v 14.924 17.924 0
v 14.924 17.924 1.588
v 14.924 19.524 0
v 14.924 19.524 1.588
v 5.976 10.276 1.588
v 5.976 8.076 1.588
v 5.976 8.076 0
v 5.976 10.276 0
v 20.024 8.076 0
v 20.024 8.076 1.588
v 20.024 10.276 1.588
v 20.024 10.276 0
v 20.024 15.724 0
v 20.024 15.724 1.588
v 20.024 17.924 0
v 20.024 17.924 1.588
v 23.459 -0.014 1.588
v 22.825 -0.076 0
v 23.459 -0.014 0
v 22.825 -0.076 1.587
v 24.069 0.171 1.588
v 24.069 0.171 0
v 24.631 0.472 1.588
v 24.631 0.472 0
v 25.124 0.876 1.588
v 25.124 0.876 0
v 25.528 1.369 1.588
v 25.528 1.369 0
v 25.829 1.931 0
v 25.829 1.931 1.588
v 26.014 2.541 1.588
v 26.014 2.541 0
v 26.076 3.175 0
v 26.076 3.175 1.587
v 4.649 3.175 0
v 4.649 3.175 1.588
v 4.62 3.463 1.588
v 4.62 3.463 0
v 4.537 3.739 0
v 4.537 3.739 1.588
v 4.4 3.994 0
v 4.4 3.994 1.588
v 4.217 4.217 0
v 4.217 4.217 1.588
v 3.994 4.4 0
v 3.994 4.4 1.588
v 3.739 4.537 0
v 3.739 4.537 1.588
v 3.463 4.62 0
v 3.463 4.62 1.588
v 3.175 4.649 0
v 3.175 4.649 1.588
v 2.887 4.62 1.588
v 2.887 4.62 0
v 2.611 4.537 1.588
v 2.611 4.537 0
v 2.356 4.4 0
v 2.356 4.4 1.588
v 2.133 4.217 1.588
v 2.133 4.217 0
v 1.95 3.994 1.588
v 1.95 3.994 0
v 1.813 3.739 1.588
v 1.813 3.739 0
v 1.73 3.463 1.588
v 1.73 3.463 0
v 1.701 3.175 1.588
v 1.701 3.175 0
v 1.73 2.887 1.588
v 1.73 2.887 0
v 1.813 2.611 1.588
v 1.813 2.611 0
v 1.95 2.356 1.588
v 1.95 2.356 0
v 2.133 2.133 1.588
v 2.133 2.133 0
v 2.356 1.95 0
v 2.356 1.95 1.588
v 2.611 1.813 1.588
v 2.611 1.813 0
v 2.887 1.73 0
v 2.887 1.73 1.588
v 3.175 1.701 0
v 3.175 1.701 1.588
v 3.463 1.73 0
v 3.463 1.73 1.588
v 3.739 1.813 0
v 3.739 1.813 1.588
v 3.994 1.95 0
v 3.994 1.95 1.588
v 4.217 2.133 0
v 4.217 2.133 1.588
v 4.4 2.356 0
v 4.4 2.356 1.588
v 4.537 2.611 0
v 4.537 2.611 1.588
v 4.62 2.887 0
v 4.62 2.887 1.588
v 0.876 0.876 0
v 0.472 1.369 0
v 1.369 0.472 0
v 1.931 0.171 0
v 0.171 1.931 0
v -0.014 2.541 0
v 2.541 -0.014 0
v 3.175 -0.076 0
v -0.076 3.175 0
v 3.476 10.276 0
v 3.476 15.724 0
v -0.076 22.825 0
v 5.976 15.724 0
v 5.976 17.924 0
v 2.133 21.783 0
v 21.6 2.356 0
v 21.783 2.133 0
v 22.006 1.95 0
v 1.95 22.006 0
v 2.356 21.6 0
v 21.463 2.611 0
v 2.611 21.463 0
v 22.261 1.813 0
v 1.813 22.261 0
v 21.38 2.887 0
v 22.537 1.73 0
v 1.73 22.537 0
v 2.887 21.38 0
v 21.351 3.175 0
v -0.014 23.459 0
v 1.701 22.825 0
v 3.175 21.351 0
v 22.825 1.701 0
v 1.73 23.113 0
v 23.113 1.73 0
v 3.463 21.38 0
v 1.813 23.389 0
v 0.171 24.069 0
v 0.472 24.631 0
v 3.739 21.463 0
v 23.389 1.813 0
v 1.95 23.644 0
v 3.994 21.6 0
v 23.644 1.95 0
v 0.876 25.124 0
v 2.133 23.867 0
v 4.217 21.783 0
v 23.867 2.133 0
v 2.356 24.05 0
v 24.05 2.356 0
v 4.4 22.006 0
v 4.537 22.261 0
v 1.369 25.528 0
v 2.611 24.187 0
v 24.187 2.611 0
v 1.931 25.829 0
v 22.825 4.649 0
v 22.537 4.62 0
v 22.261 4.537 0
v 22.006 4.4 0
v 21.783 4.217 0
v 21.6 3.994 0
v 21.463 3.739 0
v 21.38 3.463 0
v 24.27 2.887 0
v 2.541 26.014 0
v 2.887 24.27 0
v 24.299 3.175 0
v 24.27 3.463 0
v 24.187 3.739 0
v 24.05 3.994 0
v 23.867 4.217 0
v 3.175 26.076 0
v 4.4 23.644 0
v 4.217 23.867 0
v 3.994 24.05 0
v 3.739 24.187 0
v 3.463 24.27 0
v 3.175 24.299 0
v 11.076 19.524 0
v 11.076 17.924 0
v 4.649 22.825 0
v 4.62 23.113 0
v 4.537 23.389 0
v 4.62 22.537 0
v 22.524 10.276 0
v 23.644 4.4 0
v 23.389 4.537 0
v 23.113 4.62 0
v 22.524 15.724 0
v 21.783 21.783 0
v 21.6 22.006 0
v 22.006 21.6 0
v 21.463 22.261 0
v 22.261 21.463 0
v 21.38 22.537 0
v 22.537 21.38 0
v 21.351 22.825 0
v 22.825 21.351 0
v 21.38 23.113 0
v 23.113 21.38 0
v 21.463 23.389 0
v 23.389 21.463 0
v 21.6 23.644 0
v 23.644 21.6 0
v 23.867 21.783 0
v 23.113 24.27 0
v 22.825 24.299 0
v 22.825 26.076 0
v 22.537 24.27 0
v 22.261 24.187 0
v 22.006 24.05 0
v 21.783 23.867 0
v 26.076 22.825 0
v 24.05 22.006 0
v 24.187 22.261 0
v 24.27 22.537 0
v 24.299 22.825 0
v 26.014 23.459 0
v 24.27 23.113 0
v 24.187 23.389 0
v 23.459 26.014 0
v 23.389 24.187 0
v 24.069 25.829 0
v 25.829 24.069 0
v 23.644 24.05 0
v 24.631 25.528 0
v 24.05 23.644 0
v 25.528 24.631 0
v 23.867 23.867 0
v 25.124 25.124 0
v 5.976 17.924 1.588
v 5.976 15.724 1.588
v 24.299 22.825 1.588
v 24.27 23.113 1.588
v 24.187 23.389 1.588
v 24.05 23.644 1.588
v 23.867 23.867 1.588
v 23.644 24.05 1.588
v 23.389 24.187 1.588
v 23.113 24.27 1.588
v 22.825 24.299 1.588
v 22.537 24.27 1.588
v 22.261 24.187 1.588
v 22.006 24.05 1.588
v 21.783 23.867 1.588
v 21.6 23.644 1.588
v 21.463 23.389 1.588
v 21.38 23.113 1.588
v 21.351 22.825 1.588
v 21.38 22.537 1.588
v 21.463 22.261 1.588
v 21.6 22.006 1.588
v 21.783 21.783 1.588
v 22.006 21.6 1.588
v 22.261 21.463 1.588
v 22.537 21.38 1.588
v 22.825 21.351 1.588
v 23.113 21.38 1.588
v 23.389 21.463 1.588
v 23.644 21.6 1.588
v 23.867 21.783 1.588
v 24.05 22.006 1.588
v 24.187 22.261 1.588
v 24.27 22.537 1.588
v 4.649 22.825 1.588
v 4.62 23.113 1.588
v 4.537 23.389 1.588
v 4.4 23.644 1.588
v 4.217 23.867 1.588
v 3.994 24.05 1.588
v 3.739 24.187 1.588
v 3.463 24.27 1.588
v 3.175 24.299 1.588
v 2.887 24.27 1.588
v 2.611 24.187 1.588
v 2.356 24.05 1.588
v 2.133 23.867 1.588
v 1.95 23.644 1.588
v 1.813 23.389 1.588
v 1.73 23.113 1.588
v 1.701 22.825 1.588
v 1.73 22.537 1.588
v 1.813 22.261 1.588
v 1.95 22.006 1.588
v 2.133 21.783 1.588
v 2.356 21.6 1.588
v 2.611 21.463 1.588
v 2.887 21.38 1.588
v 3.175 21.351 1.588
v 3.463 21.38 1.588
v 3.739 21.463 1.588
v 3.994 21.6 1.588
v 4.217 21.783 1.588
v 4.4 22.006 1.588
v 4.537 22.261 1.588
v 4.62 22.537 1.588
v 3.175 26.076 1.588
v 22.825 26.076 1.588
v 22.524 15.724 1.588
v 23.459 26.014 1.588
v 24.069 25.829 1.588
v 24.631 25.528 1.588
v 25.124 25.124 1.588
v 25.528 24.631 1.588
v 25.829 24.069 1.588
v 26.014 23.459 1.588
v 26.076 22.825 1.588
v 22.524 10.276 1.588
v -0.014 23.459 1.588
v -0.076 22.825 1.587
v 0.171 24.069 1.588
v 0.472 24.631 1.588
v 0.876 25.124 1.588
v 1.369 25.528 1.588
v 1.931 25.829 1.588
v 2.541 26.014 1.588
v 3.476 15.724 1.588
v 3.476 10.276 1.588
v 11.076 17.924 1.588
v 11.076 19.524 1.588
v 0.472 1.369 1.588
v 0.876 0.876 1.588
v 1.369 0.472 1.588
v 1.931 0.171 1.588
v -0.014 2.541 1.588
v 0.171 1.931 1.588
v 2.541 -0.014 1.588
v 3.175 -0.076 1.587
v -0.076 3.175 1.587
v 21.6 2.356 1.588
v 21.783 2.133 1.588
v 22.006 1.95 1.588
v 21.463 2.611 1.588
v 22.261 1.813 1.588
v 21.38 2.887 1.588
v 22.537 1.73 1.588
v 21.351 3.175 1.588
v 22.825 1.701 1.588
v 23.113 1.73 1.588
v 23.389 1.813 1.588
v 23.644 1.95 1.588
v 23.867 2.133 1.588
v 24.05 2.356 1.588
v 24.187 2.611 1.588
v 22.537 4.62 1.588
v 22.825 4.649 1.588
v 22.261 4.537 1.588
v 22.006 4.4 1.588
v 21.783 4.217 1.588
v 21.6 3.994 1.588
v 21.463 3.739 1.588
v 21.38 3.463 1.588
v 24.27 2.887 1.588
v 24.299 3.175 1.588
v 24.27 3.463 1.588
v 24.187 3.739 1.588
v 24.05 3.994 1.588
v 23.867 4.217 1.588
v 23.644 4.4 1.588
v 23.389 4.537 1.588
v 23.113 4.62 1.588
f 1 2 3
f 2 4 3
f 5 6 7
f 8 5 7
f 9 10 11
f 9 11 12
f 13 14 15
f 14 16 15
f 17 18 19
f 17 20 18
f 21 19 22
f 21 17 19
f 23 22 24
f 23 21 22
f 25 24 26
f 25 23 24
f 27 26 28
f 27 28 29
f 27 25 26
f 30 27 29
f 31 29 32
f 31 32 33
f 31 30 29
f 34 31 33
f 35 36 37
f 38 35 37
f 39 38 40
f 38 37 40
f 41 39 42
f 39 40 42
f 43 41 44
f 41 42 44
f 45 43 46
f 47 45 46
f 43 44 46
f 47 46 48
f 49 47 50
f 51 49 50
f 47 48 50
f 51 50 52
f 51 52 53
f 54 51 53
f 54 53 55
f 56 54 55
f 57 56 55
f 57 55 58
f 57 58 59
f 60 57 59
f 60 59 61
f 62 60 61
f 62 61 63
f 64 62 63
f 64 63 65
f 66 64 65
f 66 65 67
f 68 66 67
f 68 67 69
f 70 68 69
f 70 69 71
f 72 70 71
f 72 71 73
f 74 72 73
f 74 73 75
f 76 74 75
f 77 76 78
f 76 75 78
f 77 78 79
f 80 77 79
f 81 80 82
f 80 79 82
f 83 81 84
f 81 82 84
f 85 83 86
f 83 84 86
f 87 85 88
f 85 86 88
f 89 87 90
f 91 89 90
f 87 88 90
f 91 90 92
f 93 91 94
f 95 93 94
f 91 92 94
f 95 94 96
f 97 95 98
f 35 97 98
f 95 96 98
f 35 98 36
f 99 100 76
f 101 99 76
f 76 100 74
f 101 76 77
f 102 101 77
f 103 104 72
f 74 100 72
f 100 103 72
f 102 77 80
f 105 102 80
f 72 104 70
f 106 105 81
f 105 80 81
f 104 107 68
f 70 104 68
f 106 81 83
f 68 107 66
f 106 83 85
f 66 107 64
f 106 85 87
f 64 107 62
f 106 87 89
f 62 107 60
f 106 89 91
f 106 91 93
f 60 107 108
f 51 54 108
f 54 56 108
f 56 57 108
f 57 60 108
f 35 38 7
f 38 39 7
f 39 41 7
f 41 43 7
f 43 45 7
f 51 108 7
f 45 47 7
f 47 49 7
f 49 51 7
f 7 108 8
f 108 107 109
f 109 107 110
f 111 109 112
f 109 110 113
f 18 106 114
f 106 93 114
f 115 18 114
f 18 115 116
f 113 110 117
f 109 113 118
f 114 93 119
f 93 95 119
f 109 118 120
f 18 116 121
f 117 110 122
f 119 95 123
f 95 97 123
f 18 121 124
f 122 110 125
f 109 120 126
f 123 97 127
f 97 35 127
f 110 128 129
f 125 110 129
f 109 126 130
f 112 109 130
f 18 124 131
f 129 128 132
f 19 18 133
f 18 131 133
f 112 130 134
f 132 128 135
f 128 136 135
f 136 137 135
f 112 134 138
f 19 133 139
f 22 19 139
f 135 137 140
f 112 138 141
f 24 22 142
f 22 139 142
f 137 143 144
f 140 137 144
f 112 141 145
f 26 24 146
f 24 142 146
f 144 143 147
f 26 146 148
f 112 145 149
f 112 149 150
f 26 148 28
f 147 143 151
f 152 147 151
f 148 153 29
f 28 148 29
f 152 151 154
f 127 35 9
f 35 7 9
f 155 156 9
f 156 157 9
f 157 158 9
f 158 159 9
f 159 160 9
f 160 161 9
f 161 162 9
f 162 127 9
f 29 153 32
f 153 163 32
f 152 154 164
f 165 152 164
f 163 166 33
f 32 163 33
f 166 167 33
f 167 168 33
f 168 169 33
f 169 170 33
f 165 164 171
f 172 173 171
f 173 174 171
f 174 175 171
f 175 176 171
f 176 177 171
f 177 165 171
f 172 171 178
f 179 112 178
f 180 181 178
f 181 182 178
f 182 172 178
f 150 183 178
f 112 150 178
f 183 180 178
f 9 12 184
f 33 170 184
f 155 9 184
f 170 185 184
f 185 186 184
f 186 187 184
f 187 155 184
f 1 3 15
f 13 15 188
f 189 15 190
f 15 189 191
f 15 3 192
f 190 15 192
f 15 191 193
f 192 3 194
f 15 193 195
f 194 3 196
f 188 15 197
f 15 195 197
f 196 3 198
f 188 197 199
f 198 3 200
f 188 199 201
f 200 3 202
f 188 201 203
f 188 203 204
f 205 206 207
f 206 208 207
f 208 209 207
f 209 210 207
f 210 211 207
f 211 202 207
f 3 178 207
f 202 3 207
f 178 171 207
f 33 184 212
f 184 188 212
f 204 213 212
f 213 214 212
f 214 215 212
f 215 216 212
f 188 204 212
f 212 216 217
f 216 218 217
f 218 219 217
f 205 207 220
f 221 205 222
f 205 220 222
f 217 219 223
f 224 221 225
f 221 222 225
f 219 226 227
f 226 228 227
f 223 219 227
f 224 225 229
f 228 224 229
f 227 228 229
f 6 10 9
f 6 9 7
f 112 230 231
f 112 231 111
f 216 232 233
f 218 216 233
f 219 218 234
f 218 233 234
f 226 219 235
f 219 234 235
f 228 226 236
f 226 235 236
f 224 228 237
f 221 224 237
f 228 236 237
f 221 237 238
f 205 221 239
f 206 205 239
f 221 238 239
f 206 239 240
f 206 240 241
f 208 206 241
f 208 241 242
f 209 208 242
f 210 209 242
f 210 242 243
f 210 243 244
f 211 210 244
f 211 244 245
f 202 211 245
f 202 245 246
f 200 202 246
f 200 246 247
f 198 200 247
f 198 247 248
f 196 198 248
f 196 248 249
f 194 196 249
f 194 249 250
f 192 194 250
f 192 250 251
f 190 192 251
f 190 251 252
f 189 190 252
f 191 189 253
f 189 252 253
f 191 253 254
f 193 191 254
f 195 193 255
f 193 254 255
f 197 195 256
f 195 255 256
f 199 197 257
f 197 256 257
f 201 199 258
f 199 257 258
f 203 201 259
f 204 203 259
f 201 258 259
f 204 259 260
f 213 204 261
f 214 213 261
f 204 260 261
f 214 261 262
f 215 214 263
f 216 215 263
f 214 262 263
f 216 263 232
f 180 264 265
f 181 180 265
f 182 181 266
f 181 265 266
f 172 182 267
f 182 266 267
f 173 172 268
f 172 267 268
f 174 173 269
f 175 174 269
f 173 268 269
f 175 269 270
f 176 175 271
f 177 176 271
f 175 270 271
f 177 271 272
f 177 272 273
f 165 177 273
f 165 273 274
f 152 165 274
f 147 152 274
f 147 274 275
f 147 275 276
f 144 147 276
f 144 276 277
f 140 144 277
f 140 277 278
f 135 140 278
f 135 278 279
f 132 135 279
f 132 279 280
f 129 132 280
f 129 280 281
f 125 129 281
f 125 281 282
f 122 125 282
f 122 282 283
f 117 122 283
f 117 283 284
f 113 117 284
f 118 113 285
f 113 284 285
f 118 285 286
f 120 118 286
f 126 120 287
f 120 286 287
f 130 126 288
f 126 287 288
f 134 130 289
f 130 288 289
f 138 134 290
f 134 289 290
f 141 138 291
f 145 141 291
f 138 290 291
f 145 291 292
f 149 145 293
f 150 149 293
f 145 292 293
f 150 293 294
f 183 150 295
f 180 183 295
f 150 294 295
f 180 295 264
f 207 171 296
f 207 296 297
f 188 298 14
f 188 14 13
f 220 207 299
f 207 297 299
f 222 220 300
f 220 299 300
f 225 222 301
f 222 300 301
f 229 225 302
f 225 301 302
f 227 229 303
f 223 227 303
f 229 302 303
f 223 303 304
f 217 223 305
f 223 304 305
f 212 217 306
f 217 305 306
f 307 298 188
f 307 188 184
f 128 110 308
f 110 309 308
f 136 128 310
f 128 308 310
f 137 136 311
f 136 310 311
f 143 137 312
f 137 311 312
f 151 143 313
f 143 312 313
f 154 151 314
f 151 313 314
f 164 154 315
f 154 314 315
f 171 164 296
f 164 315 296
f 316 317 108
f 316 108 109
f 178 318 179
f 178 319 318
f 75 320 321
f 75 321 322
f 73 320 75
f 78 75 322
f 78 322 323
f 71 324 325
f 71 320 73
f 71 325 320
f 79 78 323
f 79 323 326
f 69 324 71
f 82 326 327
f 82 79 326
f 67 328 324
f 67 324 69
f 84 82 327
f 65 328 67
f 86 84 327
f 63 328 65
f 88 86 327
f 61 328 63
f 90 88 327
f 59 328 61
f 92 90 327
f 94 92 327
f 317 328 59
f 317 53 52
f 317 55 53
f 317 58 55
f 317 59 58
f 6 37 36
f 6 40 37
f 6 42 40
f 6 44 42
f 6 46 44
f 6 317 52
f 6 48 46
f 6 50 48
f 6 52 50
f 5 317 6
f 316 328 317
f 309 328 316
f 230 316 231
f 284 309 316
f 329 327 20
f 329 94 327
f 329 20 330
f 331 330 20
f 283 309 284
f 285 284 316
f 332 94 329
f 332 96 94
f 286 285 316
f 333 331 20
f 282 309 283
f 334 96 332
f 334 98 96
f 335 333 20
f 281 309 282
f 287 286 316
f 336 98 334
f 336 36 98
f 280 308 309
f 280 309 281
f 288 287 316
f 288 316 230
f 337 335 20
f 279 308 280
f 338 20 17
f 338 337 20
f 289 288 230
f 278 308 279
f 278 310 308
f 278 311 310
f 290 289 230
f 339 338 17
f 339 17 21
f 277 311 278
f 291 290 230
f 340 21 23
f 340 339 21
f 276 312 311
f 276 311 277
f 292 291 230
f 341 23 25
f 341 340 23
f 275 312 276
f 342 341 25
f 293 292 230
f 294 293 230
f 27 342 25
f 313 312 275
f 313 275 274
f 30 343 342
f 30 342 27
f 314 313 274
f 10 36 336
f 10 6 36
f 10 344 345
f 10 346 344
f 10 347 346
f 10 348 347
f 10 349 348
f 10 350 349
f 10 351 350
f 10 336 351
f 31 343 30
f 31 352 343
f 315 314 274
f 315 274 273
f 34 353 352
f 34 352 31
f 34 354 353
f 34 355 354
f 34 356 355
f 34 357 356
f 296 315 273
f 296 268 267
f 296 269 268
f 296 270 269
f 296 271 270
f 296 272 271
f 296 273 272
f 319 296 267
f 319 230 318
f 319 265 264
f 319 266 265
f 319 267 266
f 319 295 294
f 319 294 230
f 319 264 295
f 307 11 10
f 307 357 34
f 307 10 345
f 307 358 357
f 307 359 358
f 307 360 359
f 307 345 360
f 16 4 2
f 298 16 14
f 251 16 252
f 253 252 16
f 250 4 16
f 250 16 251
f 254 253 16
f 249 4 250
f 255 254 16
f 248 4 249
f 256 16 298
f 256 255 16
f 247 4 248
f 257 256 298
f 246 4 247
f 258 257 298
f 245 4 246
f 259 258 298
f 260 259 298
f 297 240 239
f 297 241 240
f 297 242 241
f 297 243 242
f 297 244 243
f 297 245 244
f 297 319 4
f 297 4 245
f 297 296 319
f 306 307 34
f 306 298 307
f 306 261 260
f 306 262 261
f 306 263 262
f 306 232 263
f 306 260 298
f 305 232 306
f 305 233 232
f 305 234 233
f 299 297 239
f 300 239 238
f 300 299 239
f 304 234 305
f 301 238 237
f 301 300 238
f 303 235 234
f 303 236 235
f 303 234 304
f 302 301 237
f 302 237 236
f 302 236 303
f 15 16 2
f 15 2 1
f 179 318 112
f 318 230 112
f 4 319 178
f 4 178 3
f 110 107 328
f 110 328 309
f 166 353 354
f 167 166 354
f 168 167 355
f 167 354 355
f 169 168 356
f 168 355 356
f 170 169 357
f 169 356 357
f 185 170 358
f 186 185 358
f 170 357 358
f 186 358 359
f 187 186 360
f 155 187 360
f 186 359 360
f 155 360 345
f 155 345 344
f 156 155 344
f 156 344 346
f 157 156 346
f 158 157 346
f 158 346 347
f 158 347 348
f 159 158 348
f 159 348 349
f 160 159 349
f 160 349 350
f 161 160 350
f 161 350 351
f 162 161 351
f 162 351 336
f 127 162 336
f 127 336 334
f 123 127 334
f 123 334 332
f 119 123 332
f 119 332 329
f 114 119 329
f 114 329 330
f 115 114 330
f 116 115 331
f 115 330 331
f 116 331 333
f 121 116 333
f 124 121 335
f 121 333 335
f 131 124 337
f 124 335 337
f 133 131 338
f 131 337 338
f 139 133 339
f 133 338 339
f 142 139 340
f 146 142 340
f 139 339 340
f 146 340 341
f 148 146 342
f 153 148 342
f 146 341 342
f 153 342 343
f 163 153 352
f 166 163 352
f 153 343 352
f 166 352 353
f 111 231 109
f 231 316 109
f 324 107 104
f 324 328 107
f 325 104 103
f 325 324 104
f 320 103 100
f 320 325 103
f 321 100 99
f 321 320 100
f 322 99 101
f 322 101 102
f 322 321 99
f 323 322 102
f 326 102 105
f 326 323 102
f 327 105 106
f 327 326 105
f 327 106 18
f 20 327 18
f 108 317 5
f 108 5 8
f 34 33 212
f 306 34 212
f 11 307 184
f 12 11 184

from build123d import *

# Parameters (mm, degrees)
SKETCH1_W           = 26
SKETCH1_H           = 26
BOSS_EXTRUDE1_DEPTH = 1.5875
CUT_EXTRUDE1_DEPTH  = 37.803806274
FILLET1_R           = 3.175
SKETCH5_R           = 1.55
CUT_EXTRUDE2_DEPTH  = 37.803806274
MOVE_FACE1_BY       = 0.0762
MOVE_FACE1_2_BY     = 0.0762
MOVE_FACE1_3_BY     = 0.0762
MOVE_FACE1_4_BY     = 0.0762
MOVE_FACE1_5_BY     = 0.0762
MOVE_FACE1_6_BY     = 0.0762
MOVE_FACE1_7_BY     = 0.0762
MOVE_FACE1_8_BY     = 0.0762
MOVE_FACE1_9_BY     = 0.0762
MOVE_FACE1_10_BY    = 0.0762
MOVE_FACE1_11_BY    = 0.0762
MOVE_FACE1_12_BY    = 0.0762
MOVE_FACE1_13_BY    = 0.0762
MOVE_FACE1_14_BY    = 0.0762
MOVE_FACE1_15_BY    = 0.0762
MOVE_FACE1_16_BY    = 0.0762
MOVE_FACE1_17_BY    = 0.0762
MOVE_FACE1_18_BY    = 0.0762
MOVE_FACE1_19_BY    = 0.0762
MOVE_FACE1_20_BY    = 0.0762
MOVE_FACE1_21_BY    = 0.0762
MOVE_FACE1_22_BY    = 0.0762
MOVE_FACE1_23_BY    = 0.0762
MOVE_FACE1_24_BY    = 0.0762
MOVE_FACE1_25_BY    = 0.0762
MOVE_FACE1_26_BY    = 0.0762
MOVE_FACE1_27_BY    = 0.0762
MOVE_FACE1_28_BY    = 0.0762


with BuildPart() as part:
    # Sketch1 → Boss-Extrude1 (new body)
    with BuildSketch(Plane.XY):
        with Locations((13, 13)):
            Rectangle(SKETCH1_W, SKETCH1_H)
    extrude(amount=BOSS_EXTRUDE1_DEPTH)

    # Sketch2 → Cut-Extrude1 (cut, through all)
    with BuildSketch(Plane.XY.offset(1.5875)):
        Polygon((5.9, 8), (5.9, 10.2), (3.4, 10.2), (3.4, 15.8), (5.9, 15.8), (5.9, 18), (11, 18), (11, 19.6), (15, 19.6), (15, 18), (20.1, 18), (20.1, 15.8), (22.6, 15.8), (22.6, 10.2), (20.1, 10.2), (20.1, 8), align=None)
    extrude(amount=-CUT_EXTRUDE1_DEPTH, mode=Mode.SUBTRACT)

    # Fillet1
    fillet1_edges = [part.edges().sort_by_distance(p)[0] for p in [
        (0, 26, 0.79375),
        (26, 26, 0.79375),
        (26, 0, 0.79375),
        (0, 0, 0.79375),
    ]]
    fillet(fillet1_edges, radius=FILLET1_R)

    # Sketch5 → Cut-Extrude2 (cut, through all)
    with BuildSketch(Plane.XY.offset(1.5875)):
        with Locations((3.175, 22.825)):
            Circle(SKETCH5_R)
        with Locations((22.825, 22.825)):
            Circle(SKETCH5_R)
        with Locations((22.825, 3.175)):
            Circle(SKETCH5_R)
        with Locations((3.175, 3.175)):
            Circle(SKETCH5_R)
    extrude(amount=-CUT_EXTRUDE2_DEPTH, mode=Mode.SUBTRACT)

    # Move Face1: a curved face moved outward by 0.0762
    add(Solid.thicken(part.faces().sort_by_distance((25.07006403, 0.92993597, 0.79375))[0], MOVE_FACE1_BY))

    # Move Face1 2: a face moved outward by 0.0762
    extrude(part.faces().sort_by_distance((26, 13, 0.79375))[0], amount=MOVE_FACE1_2_BY, dir=(1, 0, 0))

    # Move Face1 3: a face moved outward by 0.0762
    extrude(part.faces().sort_by_distance((13, 26, 0.79375))[0], amount=MOVE_FACE1_3_BY, dir=(0, 1, 0))

    # Move Face1 4: a curved face moved outward by 0.0762
    add(Solid.thicken(part.faces().sort_by_distance((25.07006403, 25.07006403, 0.79375))[0], MOVE_FACE1_4_BY))

    # Move Face1 5: a curved face moved outward by 0.0762
    add(Solid.thicken(part.faces().sort_by_distance((0.92993597, 25.07006403, 0.79375))[0], MOVE_FACE1_5_BY))

    # Move Face1 6: a face moved outward by 0.0762
    extrude(part.faces().sort_by_distance((0, 13, 0.79375))[0], amount=MOVE_FACE1_6_BY, dir=(-1, 0, 0))

    # Move Face1 7: a face moved outward by 0.0762
    extrude(part.faces().sort_by_distance((13, 0, 0.79375))[0], amount=MOVE_FACE1_7_BY, dir=(0, -1, 0))

    # Move Face1 8: a curved face moved outward by 0.0762
    add(Solid.thicken(part.faces().sort_by_distance((0.92993597, 0.92993597, 0.79375))[0], MOVE_FACE1_8_BY))

    # Move Face1 9: a curved face moved outward by 0.0762
    add(Solid.thicken(part.faces().sort_by_distance((1.625, 3.175, 0.79375))[0], MOVE_FACE1_9_BY))

    # Move Face1 10: a curved face moved outward by 0.0762
    add(Solid.thicken(part.faces().sort_by_distance((1.625, 22.825, 0.79375))[0], MOVE_FACE1_10_BY))

    # Move Face1 11: a curved face moved outward by 0.0762
    add(Solid.thicken(part.faces().sort_by_distance((21.275, 22.825, 0.79375))[0], MOVE_FACE1_11_BY))

    # Move Face1 12: a curved face moved outward by 0.0762
    add(Solid.thicken(part.faces().sort_by_distance((21.275, 3.175, 0.79375))[0], MOVE_FACE1_12_BY))

    # Move Face1 13: a face moved outward by 0.0762
    extrude(part.faces().sort_by_distance((21.35, 10.2, 0.79375))[0], amount=MOVE_FACE1_13_BY, dir=(0, 1, 0))

    # Move Face1 14: a face moved outward by 0.0762
    extrude(part.faces().sort_by_distance((4.65, 10.2, 0.79375))[0], amount=MOVE_FACE1_14_BY, dir=(0, 1, 0))

    # Move Face1 15: a face moved outward by 0.0762
    extrude(part.faces().sort_by_distance((5.9, 9.1, 0.79375))[0], amount=MOVE_FACE1_15_BY, dir=(1, 0, 0))

    # Move Face1 16: a face moved outward by 0.0762
    extrude(part.faces().sort_by_distance((3.4, 13, 0.79375))[0], amount=MOVE_FACE1_16_BY, dir=(1, 0, 0))

    # Move Face1 17: a face moved outward by 0.0762
    extrude(part.faces().sort_by_distance((5.9, 16.9, 0.79375))[0], amount=MOVE_FACE1_17_BY, dir=(1, 0, 0))

    # Move Face1 18: a face moved outward by 0.0762
    extrude(part.faces().sort_by_distance((11, 18.8, 0.79375))[0], amount=MOVE_FACE1_18_BY, dir=(1, 0, 0))

    # Move Face1 19: a face moved outward by 0.0762
    extrude(part.faces().sort_by_distance((13, 8, 0.79375))[0], amount=MOVE_FACE1_19_BY, dir=(0, 1, 0))

    # Move Face1 20: a face moved outward by 0.0762
    extrude(part.faces().sort_by_distance((20.1, 9.1, 0.79375))[0], amount=MOVE_FACE1_20_BY, dir=(-1, 0, 0))

    # Move Face1 21: a face moved outward by 0.0762
    extrude(part.faces().sort_by_distance((22.6, 13, 0.79375))[0], amount=MOVE_FACE1_21_BY, dir=(-1, 0, 0))

    # Move Face1 22: a face moved outward by 0.0762
    extrude(part.faces().sort_by_distance((20.1, 16.9, 0.79375))[0], amount=MOVE_FACE1_22_BY, dir=(-1, 0, 0))

    # Move Face1 23: a face moved outward by 0.0762
    extrude(part.faces().sort_by_distance((15, 18.8, 0.79375))[0], amount=MOVE_FACE1_23_BY, dir=(-1, 0, 0))

    # Move Face1 24: a face moved outward by 0.0762
    extrude(part.faces().sort_by_distance((13, 19.6, 0.79375))[0], amount=MOVE_FACE1_24_BY, dir=(0, -1, 0))

    # Move Face1 25: a face moved outward by 0.0762
    extrude(part.faces().sort_by_distance((4.65, 15.8, 0.79375))[0], amount=MOVE_FACE1_25_BY, dir=(0, -1, 0))

    # Move Face1 26: a face moved outward by 0.0762
    extrude(part.faces().sort_by_distance((8.45, 18, 0.79375))[0], amount=MOVE_FACE1_26_BY, dir=(0, -1, 0))

    # Move Face1 27: a face moved outward by 0.0762
    extrude(part.faces().sort_by_distance((17.55, 18, 0.79375))[0], amount=MOVE_FACE1_27_BY, dir=(0, -1, 0))

    # Move Face1 28: a face moved outward by 0.0762
    extrude(part.faces().sort_by_distance((21.35, 15.8, 0.79375))[0], amount=MOVE_FACE1_28_BY, dir=(0, -1, 0))


solid = part.part
